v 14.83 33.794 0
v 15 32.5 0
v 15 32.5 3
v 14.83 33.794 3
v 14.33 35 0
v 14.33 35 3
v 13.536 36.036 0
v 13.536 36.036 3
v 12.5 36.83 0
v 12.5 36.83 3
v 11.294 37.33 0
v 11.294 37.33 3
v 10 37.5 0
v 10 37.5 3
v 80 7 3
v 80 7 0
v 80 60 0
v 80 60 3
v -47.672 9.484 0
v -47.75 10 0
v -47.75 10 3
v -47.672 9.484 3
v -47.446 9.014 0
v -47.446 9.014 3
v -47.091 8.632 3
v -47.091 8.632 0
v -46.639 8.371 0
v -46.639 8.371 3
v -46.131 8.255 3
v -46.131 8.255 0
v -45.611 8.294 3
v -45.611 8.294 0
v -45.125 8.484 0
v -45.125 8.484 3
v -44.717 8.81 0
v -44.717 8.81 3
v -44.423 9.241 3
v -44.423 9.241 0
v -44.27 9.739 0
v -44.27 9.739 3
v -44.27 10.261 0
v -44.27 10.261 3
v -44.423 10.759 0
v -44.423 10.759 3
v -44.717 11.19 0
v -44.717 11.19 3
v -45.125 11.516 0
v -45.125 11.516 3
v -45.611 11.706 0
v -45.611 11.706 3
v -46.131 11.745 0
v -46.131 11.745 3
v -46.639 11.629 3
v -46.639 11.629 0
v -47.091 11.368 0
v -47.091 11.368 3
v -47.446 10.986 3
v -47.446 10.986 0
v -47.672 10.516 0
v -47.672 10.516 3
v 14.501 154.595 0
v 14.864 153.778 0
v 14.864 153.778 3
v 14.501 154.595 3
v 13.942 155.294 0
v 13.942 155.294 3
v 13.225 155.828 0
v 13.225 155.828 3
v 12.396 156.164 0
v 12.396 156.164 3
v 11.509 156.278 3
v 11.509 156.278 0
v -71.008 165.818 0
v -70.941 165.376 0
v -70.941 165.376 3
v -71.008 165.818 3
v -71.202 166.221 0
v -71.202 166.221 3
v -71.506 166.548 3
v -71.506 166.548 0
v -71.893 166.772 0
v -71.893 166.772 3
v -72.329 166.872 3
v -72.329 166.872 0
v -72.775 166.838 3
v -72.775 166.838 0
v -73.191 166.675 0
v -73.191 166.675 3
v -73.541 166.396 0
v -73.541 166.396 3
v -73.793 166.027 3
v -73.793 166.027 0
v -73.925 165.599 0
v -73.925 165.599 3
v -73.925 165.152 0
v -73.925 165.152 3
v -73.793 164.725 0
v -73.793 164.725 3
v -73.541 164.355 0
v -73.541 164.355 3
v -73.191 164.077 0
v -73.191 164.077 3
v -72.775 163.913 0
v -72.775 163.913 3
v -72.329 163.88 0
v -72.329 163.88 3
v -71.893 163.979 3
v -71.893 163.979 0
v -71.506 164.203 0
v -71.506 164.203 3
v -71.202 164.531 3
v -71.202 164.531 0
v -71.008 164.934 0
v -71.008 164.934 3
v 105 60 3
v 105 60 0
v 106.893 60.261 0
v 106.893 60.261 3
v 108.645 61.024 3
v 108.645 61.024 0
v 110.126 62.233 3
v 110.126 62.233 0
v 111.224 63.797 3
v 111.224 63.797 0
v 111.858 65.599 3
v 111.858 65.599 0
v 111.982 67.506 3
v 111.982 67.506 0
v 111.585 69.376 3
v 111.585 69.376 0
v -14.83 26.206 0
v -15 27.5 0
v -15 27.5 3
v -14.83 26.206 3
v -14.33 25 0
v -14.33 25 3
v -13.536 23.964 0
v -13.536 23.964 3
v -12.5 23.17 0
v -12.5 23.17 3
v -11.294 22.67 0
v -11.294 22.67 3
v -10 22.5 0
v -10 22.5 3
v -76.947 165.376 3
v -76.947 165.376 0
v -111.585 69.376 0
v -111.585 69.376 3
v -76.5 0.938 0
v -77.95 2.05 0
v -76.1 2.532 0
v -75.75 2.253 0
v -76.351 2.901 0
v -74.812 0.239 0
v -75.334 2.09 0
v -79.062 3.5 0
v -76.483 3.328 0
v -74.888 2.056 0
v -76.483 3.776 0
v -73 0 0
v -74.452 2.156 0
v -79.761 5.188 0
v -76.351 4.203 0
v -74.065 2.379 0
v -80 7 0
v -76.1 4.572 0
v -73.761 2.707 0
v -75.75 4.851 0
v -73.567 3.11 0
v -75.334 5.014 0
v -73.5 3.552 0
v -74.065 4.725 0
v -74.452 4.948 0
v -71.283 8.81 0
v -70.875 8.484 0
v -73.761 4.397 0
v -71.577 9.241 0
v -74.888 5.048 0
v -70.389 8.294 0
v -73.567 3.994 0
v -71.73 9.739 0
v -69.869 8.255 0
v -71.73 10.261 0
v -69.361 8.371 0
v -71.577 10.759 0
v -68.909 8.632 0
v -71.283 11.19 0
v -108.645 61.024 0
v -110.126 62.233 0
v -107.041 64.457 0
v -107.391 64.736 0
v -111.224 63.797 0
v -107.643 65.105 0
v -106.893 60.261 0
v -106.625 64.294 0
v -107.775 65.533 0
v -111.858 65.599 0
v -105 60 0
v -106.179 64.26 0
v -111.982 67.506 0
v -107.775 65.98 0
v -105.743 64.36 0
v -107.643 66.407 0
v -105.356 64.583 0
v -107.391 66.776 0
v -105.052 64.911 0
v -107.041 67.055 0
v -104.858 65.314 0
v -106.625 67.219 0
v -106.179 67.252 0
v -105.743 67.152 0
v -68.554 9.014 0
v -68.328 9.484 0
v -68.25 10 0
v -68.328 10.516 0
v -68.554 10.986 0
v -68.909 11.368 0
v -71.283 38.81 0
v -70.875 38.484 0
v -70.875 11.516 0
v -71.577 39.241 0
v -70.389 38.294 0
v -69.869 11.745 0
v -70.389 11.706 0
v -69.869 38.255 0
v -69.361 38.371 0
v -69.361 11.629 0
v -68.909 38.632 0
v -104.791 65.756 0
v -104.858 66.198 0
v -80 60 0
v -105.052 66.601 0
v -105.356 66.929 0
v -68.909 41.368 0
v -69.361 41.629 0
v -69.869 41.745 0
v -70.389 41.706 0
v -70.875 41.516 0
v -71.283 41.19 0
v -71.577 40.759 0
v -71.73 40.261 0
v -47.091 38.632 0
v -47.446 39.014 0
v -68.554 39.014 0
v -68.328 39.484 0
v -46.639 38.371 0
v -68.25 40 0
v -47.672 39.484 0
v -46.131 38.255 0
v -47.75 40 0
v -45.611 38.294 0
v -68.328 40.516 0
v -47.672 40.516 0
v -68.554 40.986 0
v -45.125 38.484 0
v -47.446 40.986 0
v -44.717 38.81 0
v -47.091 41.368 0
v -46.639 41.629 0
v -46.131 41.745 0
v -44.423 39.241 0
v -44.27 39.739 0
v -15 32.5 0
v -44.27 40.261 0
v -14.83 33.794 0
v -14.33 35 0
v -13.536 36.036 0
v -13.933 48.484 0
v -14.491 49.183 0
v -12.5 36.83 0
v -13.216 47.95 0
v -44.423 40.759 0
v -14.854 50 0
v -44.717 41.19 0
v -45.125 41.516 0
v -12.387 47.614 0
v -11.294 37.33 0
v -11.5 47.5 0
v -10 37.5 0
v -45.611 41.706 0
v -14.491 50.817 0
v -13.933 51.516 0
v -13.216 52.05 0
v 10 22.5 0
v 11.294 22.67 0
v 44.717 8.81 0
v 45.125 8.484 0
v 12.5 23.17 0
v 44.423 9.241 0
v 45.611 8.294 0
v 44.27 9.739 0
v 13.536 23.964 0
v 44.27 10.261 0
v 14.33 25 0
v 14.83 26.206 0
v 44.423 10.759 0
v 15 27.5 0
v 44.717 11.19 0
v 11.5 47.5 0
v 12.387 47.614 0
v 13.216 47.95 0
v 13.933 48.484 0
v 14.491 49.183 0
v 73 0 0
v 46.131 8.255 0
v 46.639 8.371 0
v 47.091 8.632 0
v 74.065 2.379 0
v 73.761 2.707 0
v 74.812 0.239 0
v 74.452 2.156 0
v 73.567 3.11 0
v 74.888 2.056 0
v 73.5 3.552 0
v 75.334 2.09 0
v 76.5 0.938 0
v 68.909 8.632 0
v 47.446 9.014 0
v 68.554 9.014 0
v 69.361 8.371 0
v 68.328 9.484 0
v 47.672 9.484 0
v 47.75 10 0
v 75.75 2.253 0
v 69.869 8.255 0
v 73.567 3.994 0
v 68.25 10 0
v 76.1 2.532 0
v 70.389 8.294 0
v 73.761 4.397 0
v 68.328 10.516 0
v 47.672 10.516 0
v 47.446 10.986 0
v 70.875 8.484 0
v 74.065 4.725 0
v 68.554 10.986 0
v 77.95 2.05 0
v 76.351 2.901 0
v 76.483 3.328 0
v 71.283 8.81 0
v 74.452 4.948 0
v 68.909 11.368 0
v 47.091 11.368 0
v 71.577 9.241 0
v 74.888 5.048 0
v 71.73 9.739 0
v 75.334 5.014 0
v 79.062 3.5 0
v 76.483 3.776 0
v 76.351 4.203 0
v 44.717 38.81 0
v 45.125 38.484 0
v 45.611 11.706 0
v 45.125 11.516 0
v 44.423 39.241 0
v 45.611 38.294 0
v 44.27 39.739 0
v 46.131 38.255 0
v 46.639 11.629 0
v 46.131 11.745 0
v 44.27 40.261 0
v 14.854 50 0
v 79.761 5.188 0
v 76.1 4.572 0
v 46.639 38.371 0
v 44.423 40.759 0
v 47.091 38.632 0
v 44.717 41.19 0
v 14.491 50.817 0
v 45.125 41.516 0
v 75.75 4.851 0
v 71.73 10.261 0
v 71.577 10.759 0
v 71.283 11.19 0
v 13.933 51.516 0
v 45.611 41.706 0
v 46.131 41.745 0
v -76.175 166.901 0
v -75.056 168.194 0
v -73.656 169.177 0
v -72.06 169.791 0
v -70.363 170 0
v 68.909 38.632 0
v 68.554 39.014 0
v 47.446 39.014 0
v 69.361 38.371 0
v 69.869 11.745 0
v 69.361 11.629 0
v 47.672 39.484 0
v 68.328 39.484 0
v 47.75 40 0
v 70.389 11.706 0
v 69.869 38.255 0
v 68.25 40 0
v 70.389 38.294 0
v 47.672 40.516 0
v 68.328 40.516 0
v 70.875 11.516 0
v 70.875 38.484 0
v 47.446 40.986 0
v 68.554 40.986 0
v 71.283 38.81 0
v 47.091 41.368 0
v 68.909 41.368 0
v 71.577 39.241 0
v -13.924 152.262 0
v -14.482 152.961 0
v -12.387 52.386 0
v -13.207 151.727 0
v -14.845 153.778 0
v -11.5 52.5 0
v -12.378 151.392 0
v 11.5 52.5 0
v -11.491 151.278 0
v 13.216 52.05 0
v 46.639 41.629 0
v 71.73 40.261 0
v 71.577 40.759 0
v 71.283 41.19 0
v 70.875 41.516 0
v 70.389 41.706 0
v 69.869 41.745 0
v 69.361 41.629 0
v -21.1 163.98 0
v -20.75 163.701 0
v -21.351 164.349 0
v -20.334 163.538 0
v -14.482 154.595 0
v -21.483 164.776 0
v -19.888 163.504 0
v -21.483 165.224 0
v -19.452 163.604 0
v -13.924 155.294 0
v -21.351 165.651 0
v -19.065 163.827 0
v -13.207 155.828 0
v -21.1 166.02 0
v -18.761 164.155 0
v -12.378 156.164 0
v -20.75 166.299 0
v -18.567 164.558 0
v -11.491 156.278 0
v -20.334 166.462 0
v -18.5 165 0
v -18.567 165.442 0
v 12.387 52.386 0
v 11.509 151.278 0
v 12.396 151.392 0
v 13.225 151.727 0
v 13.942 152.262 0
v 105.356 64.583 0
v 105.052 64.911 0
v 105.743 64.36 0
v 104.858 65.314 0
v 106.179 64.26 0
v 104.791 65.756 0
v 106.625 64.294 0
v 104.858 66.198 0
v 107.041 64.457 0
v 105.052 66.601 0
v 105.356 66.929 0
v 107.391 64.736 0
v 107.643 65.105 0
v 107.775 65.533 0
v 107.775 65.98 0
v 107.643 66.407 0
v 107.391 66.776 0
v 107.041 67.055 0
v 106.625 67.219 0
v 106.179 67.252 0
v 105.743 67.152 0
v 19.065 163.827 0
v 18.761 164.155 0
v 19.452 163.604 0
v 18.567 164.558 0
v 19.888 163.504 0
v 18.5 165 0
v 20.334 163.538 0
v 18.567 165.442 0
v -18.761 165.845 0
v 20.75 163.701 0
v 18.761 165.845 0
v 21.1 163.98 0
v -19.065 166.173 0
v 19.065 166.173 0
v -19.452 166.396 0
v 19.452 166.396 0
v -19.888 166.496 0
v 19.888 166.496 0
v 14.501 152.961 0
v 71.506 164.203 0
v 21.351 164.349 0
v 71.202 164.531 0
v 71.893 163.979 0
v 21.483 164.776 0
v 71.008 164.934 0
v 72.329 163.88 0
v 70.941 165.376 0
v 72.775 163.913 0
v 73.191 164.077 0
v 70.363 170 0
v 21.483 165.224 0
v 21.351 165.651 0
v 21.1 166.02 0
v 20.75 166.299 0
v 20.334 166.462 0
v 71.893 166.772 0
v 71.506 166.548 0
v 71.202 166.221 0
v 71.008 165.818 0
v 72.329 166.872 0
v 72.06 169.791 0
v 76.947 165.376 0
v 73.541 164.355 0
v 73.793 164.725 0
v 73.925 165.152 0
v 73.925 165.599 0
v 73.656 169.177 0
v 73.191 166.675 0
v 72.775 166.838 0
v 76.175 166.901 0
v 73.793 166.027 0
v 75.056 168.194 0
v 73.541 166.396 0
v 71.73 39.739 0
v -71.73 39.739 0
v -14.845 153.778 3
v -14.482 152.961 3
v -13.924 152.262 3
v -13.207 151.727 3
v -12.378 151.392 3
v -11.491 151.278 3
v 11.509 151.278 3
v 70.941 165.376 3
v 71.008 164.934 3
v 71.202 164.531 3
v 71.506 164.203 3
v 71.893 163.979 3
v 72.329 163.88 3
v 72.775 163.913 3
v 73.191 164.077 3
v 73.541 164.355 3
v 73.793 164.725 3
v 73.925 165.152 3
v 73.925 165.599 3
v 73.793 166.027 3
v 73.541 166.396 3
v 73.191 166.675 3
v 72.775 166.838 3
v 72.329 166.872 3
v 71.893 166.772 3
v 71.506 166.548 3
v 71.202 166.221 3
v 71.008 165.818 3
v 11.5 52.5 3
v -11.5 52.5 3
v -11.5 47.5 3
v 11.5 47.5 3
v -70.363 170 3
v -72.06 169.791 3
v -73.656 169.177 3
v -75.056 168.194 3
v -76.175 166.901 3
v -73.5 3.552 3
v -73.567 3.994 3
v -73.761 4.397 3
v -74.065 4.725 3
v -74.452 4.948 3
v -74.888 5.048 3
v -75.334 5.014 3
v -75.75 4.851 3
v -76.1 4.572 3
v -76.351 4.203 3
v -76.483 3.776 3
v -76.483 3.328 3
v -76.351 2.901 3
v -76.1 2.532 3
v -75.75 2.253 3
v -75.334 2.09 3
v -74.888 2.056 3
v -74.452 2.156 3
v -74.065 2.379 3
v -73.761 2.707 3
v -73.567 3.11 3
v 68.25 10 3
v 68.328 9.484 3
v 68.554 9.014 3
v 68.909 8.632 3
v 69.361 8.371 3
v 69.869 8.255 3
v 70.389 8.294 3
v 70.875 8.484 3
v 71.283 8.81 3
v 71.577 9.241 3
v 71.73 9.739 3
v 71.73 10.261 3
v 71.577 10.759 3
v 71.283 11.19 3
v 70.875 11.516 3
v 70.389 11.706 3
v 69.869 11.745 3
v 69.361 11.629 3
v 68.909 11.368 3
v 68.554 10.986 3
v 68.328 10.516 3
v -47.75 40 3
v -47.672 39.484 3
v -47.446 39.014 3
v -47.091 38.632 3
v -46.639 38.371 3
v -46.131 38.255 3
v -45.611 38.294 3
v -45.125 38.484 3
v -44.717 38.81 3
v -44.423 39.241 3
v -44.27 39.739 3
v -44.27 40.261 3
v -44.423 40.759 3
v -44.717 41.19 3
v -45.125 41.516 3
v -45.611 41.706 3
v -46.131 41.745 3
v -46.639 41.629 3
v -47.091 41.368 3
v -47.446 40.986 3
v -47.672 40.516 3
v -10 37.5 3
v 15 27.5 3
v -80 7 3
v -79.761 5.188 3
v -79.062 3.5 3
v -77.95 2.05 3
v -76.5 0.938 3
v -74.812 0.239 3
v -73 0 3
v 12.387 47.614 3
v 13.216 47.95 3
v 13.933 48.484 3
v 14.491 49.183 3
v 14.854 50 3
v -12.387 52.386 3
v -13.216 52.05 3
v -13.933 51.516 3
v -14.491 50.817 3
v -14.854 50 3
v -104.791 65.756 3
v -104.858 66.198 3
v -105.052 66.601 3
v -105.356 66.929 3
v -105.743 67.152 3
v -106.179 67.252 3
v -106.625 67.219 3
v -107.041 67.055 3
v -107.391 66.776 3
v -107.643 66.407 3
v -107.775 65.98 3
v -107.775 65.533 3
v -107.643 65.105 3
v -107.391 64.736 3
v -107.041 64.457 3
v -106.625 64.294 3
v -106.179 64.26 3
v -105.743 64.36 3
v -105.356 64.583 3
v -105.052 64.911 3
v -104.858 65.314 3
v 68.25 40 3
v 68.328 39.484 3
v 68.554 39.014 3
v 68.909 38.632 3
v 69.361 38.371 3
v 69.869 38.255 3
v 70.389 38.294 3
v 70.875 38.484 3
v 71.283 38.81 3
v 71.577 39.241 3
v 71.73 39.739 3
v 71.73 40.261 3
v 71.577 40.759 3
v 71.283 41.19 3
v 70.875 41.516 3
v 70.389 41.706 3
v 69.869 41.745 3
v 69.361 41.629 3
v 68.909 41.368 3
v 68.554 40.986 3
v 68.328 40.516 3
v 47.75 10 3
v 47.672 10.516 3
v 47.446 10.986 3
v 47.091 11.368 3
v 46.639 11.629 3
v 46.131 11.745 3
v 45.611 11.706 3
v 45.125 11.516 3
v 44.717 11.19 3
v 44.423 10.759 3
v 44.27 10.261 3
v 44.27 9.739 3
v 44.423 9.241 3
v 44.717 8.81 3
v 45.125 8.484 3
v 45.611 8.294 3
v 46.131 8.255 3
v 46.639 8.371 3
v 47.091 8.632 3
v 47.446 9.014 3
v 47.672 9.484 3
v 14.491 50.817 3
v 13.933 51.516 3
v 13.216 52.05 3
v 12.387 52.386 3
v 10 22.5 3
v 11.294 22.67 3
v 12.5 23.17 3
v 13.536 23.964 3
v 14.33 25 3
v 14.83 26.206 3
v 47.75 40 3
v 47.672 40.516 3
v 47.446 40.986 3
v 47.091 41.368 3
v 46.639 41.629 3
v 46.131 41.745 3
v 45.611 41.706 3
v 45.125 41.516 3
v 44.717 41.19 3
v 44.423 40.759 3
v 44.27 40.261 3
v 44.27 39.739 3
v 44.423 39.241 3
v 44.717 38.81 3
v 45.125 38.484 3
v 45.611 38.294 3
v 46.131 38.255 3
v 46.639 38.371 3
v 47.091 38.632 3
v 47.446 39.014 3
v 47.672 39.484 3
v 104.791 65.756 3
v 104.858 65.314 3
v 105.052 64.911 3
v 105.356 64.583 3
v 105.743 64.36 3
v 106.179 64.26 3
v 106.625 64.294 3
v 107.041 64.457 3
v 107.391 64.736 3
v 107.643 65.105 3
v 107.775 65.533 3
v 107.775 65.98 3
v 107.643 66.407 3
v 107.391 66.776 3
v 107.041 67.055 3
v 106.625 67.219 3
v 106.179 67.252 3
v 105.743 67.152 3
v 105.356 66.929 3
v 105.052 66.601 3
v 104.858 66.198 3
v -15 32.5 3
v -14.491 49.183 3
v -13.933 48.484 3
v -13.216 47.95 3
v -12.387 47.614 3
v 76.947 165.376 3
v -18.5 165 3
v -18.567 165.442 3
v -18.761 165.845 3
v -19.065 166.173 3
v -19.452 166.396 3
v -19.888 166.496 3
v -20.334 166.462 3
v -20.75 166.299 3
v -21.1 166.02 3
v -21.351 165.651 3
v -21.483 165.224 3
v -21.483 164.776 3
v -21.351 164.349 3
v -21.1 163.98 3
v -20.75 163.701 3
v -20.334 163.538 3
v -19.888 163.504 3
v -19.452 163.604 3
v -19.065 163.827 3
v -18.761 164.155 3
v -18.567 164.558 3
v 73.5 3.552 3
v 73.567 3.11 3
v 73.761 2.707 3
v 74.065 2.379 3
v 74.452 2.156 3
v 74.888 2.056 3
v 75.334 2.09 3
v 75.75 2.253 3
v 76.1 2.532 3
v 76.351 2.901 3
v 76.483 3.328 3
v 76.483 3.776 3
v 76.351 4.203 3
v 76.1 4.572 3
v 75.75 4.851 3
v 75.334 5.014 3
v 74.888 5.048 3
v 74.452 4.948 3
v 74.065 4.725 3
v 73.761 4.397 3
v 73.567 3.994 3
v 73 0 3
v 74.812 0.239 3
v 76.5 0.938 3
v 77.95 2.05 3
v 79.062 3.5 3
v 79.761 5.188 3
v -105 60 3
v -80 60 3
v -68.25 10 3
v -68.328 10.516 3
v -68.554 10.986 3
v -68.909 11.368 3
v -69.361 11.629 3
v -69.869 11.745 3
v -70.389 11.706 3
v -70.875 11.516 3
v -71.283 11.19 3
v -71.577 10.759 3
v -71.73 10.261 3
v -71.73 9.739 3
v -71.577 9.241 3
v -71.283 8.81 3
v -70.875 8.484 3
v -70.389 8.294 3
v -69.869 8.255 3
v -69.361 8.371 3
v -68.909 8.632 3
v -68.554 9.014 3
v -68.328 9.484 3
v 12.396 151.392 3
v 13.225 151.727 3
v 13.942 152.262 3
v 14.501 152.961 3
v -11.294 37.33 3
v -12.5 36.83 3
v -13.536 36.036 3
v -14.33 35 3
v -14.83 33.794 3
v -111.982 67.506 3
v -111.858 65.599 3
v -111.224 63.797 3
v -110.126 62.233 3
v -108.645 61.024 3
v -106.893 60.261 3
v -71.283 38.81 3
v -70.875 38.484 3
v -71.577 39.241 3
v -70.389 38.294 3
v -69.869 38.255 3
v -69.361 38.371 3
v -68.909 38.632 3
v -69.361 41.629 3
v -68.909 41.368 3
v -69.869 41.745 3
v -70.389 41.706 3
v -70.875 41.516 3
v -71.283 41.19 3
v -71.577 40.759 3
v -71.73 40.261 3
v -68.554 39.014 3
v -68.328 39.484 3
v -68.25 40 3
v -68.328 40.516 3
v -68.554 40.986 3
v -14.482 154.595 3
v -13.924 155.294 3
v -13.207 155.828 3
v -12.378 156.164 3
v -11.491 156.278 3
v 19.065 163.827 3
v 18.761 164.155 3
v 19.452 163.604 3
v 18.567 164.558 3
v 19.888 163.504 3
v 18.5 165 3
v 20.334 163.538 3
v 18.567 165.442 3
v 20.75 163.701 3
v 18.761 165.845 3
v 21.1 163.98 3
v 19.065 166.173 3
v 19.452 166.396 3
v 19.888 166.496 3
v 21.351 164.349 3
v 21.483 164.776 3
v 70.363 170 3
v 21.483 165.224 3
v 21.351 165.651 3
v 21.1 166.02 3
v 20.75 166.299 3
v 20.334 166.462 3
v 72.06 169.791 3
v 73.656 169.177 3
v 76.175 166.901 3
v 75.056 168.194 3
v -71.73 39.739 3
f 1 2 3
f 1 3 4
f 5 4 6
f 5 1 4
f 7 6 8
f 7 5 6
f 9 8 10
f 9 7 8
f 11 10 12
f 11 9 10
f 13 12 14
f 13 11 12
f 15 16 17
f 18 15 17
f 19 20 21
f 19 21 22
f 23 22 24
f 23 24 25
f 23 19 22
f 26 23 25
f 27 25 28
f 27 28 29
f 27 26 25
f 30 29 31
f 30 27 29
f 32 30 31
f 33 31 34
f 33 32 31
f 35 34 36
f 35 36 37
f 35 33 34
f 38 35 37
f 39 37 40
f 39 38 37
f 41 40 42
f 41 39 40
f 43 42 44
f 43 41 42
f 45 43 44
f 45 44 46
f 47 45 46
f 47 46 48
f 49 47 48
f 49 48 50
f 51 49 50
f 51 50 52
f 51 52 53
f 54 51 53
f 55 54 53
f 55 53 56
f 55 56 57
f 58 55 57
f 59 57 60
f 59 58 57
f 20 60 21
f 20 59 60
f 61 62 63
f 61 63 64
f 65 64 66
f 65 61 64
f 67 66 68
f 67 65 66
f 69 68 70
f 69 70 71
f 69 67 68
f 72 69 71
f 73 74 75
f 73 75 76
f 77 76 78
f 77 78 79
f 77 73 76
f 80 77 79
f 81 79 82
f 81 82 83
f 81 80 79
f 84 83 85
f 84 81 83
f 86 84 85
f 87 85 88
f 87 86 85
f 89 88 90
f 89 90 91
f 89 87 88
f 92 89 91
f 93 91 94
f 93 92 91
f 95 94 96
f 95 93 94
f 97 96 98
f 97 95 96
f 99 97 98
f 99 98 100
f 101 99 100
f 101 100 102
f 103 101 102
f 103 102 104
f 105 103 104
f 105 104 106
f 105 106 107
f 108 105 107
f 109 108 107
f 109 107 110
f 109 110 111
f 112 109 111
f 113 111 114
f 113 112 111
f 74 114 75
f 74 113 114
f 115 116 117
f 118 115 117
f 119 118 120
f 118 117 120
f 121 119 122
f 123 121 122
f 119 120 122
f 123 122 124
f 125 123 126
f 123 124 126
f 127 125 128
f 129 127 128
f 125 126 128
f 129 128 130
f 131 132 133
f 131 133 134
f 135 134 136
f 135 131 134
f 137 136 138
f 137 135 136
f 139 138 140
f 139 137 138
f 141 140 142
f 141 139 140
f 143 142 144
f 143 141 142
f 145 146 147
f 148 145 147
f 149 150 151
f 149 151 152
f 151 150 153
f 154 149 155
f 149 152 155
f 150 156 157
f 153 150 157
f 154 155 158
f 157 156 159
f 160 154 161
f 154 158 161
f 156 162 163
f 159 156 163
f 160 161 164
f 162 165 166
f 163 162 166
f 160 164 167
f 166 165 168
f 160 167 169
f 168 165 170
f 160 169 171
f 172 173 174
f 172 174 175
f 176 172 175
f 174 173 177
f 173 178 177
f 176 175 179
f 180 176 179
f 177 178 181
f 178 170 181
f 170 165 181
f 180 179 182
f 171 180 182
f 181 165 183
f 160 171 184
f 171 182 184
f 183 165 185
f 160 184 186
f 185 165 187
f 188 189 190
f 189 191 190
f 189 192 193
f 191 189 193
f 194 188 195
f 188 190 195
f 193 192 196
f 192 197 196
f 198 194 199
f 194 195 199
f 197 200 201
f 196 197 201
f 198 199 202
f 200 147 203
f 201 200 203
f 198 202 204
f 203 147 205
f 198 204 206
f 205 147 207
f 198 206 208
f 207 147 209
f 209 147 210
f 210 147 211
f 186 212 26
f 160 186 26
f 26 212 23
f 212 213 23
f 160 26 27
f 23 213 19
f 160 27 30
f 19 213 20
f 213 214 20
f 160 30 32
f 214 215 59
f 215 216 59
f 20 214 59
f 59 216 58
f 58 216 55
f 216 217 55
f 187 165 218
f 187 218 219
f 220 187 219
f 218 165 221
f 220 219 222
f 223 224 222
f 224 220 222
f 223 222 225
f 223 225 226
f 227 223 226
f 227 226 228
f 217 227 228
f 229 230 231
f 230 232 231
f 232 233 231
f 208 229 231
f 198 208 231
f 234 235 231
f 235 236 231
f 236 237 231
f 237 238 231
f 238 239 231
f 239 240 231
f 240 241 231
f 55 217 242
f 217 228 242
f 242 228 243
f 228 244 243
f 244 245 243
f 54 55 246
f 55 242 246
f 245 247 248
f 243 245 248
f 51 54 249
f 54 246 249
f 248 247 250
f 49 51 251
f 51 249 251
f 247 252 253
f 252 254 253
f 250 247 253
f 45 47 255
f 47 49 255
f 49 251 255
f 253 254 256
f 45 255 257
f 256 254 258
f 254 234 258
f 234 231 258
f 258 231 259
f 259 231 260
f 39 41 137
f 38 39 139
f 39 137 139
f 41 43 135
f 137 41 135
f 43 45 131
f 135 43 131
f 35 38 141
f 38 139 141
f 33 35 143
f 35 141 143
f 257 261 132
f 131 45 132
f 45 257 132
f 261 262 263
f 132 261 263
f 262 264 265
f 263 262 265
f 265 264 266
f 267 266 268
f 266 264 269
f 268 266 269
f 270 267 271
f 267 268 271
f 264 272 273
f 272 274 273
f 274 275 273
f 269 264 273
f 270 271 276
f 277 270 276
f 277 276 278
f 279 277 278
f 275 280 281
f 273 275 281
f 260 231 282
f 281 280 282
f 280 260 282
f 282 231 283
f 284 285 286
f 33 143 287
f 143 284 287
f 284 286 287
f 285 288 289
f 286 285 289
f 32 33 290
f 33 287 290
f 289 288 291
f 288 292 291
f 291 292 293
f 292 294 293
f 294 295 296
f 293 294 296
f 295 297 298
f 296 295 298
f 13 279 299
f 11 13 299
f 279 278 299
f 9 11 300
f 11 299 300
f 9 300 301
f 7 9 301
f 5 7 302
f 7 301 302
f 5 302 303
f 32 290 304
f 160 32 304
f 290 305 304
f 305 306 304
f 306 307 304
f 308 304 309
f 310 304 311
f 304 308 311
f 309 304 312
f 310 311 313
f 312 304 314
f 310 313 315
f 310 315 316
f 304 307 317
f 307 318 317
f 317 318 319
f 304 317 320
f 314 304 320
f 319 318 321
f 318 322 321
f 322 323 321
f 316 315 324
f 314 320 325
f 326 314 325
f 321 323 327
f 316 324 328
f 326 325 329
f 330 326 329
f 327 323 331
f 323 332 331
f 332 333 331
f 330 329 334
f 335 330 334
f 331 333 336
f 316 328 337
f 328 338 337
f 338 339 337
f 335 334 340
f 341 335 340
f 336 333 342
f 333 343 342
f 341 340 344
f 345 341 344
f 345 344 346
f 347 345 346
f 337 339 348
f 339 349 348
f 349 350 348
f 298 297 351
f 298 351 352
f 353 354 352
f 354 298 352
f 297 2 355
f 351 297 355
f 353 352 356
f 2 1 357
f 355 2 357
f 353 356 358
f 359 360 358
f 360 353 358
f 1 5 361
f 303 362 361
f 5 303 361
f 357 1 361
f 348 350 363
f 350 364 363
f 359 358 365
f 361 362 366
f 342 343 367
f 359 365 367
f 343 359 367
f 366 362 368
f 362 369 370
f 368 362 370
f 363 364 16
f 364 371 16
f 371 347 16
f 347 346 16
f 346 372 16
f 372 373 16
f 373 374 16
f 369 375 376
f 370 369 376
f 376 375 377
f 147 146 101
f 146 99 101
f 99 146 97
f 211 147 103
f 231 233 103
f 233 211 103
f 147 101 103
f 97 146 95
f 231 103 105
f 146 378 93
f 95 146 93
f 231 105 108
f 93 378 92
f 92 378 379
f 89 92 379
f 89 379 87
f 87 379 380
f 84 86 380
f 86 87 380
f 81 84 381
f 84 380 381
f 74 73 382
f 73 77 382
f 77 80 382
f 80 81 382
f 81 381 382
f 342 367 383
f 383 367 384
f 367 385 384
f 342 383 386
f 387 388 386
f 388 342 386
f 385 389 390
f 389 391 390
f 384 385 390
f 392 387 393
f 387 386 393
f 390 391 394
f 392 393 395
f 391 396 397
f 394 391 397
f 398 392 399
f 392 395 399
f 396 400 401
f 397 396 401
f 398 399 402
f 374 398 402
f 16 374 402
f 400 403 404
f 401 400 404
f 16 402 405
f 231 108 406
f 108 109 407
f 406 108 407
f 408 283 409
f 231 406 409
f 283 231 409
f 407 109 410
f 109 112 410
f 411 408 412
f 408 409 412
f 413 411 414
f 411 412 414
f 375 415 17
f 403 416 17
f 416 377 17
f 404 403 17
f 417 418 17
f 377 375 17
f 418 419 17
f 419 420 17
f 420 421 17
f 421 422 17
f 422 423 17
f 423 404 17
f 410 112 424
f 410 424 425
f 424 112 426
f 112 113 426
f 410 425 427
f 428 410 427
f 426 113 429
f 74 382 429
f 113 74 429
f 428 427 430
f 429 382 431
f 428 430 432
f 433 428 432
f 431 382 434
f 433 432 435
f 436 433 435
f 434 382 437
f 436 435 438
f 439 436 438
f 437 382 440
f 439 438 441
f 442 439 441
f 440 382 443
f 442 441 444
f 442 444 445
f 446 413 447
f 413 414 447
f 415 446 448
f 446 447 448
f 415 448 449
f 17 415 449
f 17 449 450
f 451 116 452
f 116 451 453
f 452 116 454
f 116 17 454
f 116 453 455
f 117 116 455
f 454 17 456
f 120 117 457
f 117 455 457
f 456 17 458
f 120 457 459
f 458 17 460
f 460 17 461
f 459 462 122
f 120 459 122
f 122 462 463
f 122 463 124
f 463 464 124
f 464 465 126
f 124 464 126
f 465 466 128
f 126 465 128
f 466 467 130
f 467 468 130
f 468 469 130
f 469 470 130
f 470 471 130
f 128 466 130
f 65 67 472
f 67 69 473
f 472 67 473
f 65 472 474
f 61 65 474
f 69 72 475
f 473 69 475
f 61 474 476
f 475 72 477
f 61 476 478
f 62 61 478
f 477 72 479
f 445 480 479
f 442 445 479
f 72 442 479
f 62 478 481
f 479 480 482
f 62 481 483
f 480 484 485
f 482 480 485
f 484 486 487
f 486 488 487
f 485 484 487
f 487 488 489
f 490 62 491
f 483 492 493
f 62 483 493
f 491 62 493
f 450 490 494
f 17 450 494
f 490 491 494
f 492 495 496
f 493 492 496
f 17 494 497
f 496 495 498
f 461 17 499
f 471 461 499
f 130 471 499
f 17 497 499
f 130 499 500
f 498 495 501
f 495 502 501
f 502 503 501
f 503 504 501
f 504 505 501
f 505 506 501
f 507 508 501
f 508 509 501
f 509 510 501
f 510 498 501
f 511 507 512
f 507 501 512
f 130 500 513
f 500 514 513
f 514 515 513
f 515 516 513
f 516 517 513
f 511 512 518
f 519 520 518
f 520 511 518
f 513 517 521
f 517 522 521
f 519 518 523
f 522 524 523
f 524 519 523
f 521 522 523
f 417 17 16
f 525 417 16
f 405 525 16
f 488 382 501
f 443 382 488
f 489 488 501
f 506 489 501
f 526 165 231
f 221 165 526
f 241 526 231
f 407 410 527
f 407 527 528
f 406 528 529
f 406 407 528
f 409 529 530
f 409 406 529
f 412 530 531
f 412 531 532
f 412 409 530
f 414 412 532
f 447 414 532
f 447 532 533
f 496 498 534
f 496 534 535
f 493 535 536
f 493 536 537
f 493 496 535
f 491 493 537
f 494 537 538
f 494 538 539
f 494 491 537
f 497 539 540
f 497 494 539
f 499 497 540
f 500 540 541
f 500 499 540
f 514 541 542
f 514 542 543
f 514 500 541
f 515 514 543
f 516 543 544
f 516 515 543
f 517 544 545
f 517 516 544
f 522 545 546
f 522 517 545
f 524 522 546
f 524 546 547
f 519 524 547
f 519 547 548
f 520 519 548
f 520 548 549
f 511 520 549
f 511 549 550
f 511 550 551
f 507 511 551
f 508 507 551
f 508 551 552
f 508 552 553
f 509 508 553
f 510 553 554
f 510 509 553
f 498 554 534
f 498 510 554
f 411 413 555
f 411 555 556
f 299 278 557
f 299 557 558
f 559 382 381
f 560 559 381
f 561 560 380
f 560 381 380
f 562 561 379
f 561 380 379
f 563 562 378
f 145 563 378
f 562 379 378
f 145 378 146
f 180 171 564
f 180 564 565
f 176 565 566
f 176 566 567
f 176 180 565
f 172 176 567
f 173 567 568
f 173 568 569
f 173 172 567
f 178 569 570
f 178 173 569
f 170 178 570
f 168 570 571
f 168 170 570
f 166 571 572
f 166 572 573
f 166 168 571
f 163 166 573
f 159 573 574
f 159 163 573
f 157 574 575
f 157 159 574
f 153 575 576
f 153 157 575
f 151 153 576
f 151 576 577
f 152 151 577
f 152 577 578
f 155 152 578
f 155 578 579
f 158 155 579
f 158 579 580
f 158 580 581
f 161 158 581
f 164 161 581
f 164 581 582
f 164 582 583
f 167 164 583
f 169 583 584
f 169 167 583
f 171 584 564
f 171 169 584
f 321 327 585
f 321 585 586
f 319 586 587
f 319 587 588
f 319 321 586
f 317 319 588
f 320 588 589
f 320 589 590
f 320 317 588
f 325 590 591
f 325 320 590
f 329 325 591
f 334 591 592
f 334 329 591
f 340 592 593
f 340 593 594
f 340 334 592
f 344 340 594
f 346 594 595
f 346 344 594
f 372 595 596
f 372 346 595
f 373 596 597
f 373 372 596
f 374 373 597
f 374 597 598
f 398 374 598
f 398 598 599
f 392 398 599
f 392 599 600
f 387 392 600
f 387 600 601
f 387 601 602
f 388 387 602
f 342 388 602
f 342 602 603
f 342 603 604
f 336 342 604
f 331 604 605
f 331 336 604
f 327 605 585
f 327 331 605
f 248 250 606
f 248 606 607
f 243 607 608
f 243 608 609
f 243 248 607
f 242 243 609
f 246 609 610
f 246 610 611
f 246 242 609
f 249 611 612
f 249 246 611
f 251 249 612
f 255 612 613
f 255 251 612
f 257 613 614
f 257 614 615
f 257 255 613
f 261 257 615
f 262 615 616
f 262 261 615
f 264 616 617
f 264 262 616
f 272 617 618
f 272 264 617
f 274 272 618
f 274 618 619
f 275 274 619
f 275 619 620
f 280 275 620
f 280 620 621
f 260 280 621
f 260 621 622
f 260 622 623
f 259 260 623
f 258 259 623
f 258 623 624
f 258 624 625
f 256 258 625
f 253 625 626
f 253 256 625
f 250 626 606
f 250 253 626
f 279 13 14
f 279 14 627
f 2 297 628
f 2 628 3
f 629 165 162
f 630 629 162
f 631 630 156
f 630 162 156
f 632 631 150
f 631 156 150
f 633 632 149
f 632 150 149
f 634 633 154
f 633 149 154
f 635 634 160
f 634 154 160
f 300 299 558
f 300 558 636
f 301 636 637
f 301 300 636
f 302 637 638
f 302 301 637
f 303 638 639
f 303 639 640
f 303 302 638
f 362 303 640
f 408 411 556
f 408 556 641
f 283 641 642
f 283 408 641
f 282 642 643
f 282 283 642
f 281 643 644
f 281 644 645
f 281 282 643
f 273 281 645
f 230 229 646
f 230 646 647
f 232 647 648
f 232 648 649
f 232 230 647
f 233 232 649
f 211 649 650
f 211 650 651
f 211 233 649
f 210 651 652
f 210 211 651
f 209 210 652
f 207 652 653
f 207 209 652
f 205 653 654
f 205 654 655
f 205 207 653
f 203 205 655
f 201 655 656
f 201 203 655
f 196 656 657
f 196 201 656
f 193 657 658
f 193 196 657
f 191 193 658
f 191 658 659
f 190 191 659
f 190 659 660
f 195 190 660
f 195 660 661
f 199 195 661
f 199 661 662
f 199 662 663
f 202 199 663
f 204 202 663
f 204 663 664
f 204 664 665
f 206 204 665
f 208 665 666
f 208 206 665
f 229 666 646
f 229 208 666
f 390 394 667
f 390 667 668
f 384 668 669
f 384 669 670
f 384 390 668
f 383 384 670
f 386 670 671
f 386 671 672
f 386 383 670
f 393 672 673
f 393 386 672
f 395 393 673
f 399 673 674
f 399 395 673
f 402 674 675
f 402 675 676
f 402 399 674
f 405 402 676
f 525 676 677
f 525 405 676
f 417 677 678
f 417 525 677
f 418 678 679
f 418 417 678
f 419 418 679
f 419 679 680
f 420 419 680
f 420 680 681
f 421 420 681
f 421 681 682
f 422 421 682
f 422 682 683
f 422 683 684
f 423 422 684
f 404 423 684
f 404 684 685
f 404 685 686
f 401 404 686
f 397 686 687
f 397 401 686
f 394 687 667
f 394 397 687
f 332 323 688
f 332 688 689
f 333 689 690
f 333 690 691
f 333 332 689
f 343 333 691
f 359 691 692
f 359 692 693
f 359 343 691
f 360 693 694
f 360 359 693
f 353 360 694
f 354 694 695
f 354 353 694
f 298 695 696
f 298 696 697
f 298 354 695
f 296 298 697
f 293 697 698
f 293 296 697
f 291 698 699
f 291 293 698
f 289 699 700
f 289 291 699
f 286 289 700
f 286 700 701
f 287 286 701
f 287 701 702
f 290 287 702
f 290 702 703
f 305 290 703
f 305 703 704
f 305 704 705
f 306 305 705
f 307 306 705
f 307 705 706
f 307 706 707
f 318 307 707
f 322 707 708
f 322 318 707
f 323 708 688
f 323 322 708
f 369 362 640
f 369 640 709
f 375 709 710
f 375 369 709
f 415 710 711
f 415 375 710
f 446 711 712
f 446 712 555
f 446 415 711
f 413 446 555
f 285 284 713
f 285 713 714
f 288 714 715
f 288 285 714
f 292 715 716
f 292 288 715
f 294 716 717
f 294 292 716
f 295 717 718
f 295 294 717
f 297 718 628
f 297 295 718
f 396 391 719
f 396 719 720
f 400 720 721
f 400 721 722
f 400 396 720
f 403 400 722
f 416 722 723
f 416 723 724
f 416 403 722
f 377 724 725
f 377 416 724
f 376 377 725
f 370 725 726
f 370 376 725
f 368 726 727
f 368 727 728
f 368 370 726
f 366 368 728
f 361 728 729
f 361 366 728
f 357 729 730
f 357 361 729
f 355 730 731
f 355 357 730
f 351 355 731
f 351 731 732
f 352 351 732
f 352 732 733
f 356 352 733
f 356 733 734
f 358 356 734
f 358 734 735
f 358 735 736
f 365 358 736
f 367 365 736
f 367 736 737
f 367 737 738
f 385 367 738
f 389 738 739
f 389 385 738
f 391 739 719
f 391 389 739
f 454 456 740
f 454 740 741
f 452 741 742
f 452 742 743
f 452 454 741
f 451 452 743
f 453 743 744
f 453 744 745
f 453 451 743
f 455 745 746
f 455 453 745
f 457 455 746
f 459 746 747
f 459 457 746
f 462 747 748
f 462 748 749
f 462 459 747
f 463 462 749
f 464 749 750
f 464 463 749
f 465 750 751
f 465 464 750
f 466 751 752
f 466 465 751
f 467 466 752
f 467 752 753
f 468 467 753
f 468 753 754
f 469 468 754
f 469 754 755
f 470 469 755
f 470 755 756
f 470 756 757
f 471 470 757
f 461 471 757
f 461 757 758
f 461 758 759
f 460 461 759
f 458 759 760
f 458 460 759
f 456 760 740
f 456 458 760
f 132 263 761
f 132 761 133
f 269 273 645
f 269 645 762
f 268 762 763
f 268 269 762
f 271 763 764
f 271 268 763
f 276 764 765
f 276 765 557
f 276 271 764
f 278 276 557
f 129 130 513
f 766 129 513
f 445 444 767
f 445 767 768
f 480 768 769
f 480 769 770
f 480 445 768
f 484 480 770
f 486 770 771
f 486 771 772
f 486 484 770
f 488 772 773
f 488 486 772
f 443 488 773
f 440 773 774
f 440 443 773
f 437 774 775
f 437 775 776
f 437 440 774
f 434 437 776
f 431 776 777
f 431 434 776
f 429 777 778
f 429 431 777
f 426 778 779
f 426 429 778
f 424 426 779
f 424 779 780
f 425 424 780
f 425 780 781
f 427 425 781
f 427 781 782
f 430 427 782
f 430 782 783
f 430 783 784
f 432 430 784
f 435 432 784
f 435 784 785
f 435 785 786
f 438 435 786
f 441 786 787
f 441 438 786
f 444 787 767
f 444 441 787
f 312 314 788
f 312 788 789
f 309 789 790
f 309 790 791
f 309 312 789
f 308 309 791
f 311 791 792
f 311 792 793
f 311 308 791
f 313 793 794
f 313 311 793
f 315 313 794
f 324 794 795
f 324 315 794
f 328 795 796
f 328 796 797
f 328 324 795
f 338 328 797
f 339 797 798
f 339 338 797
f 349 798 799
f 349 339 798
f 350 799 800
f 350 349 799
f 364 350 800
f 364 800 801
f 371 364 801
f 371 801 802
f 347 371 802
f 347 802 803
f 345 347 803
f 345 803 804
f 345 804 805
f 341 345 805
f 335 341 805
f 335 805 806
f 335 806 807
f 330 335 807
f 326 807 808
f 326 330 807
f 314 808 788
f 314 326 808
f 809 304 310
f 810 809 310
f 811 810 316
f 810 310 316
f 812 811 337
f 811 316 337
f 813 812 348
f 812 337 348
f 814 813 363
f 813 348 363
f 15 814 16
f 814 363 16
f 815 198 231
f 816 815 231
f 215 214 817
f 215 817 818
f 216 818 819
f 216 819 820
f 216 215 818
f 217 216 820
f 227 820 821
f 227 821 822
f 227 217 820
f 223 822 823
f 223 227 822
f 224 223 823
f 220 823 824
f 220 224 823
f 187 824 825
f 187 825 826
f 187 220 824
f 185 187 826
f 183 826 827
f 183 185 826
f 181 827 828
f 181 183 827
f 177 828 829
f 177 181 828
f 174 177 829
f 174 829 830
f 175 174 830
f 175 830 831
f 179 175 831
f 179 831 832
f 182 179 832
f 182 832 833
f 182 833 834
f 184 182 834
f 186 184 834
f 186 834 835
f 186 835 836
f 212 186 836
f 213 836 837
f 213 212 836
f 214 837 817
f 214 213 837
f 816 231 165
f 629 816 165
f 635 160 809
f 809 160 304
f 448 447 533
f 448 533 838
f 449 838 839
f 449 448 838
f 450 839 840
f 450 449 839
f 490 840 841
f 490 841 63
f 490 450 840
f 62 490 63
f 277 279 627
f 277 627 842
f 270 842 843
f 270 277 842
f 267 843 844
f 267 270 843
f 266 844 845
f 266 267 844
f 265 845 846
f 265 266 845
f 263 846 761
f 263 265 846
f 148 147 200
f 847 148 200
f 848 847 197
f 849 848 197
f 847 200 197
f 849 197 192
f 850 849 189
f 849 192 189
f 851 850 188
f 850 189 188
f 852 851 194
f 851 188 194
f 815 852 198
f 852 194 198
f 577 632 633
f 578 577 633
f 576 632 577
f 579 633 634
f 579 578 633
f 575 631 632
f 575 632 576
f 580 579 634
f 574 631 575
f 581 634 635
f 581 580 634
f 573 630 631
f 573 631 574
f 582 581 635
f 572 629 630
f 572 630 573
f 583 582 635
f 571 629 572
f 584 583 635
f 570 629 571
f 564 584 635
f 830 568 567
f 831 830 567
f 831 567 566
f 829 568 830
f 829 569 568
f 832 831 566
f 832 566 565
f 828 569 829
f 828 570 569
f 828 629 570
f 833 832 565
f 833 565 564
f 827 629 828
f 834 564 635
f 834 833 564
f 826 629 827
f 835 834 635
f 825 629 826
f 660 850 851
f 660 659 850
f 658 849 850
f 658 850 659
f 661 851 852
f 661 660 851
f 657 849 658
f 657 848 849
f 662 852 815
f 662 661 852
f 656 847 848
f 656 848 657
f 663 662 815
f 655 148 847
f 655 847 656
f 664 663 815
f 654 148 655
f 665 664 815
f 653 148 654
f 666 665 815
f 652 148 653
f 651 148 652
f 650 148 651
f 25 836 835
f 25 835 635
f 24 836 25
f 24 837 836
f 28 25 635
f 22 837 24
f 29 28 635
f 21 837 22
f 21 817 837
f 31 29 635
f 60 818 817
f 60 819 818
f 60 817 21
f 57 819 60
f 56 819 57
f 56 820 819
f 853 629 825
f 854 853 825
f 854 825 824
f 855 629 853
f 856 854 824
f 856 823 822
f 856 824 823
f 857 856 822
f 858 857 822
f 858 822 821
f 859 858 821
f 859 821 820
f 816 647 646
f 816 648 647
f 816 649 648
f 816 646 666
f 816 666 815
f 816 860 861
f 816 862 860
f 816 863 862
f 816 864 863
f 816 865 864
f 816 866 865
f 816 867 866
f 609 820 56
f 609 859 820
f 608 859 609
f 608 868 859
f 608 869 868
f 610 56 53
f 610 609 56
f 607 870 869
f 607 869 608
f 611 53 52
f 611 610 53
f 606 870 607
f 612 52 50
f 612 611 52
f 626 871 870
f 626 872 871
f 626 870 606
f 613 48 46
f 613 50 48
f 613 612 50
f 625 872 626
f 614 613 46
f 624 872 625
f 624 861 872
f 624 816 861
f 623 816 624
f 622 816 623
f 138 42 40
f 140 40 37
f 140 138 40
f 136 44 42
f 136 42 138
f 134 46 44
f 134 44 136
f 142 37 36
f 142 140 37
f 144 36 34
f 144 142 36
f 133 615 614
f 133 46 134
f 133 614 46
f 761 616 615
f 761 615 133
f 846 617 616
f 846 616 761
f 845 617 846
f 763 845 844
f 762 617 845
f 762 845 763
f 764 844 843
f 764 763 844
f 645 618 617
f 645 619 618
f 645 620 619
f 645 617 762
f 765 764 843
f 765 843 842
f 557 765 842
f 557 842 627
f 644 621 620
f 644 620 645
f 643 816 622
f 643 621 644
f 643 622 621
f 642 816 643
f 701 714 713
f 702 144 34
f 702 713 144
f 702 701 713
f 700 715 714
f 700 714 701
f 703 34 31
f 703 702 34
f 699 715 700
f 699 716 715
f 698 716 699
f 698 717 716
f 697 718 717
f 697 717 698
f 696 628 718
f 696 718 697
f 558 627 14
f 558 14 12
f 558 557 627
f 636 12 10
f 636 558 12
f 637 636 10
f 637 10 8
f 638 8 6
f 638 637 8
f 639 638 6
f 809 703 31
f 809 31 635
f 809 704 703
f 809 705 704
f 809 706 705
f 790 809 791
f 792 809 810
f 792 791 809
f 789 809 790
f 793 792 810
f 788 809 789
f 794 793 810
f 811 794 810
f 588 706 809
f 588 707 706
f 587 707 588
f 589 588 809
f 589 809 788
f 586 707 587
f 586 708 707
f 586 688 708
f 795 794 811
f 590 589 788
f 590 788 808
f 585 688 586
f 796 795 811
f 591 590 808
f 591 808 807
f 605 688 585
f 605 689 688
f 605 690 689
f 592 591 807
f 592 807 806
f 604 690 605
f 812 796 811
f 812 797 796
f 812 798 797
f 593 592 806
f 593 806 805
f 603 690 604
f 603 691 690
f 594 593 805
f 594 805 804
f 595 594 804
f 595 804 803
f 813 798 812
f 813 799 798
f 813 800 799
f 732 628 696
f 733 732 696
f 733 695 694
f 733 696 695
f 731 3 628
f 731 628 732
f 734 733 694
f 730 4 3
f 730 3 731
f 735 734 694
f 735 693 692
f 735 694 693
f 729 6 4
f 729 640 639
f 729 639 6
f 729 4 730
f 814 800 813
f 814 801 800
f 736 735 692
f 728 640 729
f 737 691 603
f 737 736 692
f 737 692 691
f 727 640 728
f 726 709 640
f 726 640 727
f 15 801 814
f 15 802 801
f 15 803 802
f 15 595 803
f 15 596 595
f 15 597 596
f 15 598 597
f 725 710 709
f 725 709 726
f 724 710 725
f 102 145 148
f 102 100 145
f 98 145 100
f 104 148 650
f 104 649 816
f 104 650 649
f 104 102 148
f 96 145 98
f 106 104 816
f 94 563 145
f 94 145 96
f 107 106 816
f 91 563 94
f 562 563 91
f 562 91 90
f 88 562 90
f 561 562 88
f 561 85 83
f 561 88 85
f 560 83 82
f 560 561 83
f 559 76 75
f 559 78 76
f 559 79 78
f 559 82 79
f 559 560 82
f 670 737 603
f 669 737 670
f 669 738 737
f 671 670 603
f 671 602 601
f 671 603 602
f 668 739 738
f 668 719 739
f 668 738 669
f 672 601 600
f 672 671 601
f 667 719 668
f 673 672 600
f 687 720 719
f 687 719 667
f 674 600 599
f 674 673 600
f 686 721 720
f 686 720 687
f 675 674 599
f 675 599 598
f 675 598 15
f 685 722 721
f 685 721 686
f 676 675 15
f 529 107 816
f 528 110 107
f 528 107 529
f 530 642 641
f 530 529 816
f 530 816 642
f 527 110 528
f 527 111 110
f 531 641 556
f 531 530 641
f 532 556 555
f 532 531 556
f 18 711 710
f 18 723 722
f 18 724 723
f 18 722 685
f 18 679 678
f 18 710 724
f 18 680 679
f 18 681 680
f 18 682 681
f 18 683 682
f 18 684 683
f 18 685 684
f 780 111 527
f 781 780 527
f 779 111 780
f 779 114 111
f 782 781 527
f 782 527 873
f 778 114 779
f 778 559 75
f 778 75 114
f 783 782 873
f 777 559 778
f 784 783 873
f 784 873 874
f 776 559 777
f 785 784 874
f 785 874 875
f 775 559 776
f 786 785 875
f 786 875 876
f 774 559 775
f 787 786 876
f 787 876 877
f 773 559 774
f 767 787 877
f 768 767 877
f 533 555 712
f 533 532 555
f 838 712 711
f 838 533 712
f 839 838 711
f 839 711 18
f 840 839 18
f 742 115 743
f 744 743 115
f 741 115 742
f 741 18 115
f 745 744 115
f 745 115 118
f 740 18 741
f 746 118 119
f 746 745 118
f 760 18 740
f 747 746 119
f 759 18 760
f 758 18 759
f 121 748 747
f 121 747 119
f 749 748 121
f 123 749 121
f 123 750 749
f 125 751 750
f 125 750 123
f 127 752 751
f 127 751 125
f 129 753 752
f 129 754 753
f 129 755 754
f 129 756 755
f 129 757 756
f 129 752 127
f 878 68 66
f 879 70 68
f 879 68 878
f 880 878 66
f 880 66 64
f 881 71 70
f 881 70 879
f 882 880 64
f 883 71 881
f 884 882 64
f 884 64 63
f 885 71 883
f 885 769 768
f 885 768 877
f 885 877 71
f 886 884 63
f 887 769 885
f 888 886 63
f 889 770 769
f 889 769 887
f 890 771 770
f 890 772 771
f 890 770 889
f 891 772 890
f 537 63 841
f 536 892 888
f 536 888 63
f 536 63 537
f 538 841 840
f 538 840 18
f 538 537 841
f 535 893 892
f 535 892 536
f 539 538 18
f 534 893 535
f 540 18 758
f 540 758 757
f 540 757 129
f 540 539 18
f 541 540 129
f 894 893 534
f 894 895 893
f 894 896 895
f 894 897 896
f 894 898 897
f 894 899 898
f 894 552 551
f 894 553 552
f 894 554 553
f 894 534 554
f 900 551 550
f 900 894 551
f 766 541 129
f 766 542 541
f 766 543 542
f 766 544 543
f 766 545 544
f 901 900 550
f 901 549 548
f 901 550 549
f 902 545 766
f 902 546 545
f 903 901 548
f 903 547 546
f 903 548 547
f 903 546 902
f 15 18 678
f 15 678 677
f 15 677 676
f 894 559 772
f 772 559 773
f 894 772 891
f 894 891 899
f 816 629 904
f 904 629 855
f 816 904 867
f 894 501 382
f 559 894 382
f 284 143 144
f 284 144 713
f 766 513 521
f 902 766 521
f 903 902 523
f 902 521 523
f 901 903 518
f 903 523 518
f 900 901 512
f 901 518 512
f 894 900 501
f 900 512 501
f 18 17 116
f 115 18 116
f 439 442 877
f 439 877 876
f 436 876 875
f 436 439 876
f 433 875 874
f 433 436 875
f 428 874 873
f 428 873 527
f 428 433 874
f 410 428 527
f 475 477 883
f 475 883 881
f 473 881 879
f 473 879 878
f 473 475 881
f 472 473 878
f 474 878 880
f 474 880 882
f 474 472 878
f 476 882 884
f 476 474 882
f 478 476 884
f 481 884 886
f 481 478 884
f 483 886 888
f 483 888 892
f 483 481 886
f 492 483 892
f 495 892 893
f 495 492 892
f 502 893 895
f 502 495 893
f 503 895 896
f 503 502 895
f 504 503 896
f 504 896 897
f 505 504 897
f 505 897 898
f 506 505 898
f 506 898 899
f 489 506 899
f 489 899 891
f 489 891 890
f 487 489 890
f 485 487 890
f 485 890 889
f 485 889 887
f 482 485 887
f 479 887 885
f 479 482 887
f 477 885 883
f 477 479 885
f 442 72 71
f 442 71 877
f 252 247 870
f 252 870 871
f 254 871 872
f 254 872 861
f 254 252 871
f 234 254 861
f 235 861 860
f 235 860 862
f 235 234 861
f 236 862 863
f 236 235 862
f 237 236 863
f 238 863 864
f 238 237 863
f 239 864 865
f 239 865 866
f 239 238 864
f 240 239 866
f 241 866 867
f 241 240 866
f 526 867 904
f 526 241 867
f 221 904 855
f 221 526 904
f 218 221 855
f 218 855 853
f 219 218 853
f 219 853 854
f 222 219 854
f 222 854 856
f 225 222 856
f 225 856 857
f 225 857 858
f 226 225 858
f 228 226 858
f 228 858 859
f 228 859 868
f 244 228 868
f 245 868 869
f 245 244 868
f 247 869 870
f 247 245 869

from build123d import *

# Parameters (mm, degrees)
SKETCH_2_R      = 1.75
SKETCH_2_R_2    = 1.5
EXTRUDE_2_DEPTH = 3


with BuildPart() as part:
    # 草图2 → 凸台-拉伸2 (new body)
    with BuildSketch(Plane.XY):
        with BuildLine():
            Line((-73, 0), (73, 0))
            ThreePointArc((73, 0), (77.949747468, 2.050252532), (80, 7))
            Line((80, 7), (80, 60))
            Line((80, 60), (105, 60))
            ThreePointArc((105, 60), (110.7284389, 62.976942983), (111.584524662, 69.375717782))
            Line((111.584524662, 69.375717782), (76.947414353, 165.375717782))
            ThreePointArc((76.947414353, 165.375717782), (74.385946708, 168.7284389), (70.362889691, 170))
            Line((70.362889691, 170), (-70.362889691, 170))
            ThreePointArc((-70.362889691, 170), (-74.385946708, 168.7284389), (-76.947414353, 165.375717782))
            Line((-76.947414353, 165.375717782), (-111.584524662, 69.375717782))
            ThreePointArc((-111.584524662, 69.375717782), (-110.7284389, 62.976942983), (-105, 60))
            Line((-105, 60), (-80, 60))
            Line((-80, 60), (-80, 7))
            ThreePointArc((-80, 7), (-77.949747468, 2.050252532), (-73, 0))
        make_face()
        with Locations((-70, 10)):
            Circle(SKETCH_2_R, mode=Mode.SUBTRACT)
        with Locations((-70, 40)):
            Circle(SKETCH_2_R, mode=Mode.SUBTRACT)
        with Locations(Location((-46, 40, 0), (0, 0, 180))):
            Circle(SKETCH_2_R, mode=Mode.SUBTRACT)
        with Locations(Location((-46, 10, 0), (0, 0, 180))):
            Circle(SKETCH_2_R, mode=Mode.SUBTRACT)
        with Locations((46, 10)):
            Circle(SKETCH_2_R, mode=Mode.SUBTRACT)
        with Locations((46, 40)):
            Circle(SKETCH_2_R, mode=Mode.SUBTRACT)
        with Locations(Location((70, 40, 0), (0, 0, 180))):
            Circle(SKETCH_2_R, mode=Mode.SUBTRACT)
        with Locations(Location((70, 10, 0), (0, 0, 180))):
            Circle(SKETCH_2_R, mode=Mode.SUBTRACT)
        with Locations((-72.441382232, 165.375717782)):
            Circle(SKETCH_2_R_2, mode=Mode.SUBTRACT)
        with Locations((-106.29148568, 65.75613767)):
            Circle(SKETCH_2_R_2, mode=Mode.SUBTRACT)
        with Locations(Location((106.29148568, 65.75613767, 0), (0, 0, 180))):
            Circle(SKETCH_2_R_2, mode=Mode.SUBTRACT)
        with Locations(Location((72.441382232, 165.375717782, 0), (0, 0, 180))):
            Circle(SKETCH_2_R_2, mode=Mode.SUBTRACT)
        with Locations((-20, 165)):
            Circle(SKETCH_2_R_2, mode=Mode.SUBTRACT)
        with Locations(Location((20, 165, 0), (0, 0, 180))):
            Circle(SKETCH_2_R_2, mode=Mode.SUBTRACT)
        with Locations((-75, 3.552033702)):
            Circle(SKETCH_2_R_2, mode=Mode.SUBTRACT)
        with Locations(Location((75, 3.552033702, 0), (0, 0, 180))):
            Circle(SKETCH_2_R_2, mode=Mode.SUBTRACT)
        with BuildLine():
            Line((-11.490577198, 151.277899951), (11.509422802, 151.277899951))
            ThreePointArc((11.509422802, 151.277899951), (13.601072868, 151.971656911), (14.863524768, 153.777899951))
            ThreePointArc((14.863524768, 153.777899951), (13.601072868, 155.584142991), (11.509422802, 156.277899951))
            Line((11.509422802, 156.277899951), (-11.490577198, 156.277899951))
            ThreePointArc((-11.490577198, 156.277899951), (-13.582227264, 155.584142991), (-14.844679164, 153.777899951))
            ThreePointArc((-14.844679164, 153.777899951), (-13.582227264, 151.971656911), (-11.490577198, 151.277899951))
        make_face(mode=Mode.SUBTRACT)
        with BuildLine():
            Line((-11.5, 47.5), (11.5, 47.5))
            ThreePointArc((11.5, 47.5), (13.591650066, 48.19375696), (14.854101966, 50))
            ThreePointArc((14.854101966, 50), (13.591650066, 51.80624304), (11.5, 52.5))
            Line((11.5, 52.5), (-11.5, 52.5))
            ThreePointArc((-11.5, 52.5), (-13.591650066, 51.80624304), (-14.854101966, 50))
            ThreePointArc((-14.854101966, 50), (-13.591650066, 48.19375696), (-11.5, 47.5))
        make_face(mode=Mode.SUBTRACT)
        with BuildLine():
            Line((-10, 22.5), (10, 22.5))
            ThreePointArc((10, 22.5), (13.535533906, 23.964466094), (15, 27.5))
            Line((15, 27.5), (15, 32.5))
            ThreePointArc((15, 32.5), (13.535533906, 36.035533906), (10, 37.5))
            Line((10, 37.5), (-10, 37.5))
            ThreePointArc((-10, 37.5), (-13.535533906, 36.035533906), (-15, 32.5))
            Line((-15, 32.5), (-15, 27.5))
            ThreePointArc((-15, 27.5), (-13.535533906, 23.964466094), (-10, 22.5))
        make_face(mode=Mode.SUBTRACT)
    extrude(amount=EXTRUDE_2_DEPTH)


solid = part.part
